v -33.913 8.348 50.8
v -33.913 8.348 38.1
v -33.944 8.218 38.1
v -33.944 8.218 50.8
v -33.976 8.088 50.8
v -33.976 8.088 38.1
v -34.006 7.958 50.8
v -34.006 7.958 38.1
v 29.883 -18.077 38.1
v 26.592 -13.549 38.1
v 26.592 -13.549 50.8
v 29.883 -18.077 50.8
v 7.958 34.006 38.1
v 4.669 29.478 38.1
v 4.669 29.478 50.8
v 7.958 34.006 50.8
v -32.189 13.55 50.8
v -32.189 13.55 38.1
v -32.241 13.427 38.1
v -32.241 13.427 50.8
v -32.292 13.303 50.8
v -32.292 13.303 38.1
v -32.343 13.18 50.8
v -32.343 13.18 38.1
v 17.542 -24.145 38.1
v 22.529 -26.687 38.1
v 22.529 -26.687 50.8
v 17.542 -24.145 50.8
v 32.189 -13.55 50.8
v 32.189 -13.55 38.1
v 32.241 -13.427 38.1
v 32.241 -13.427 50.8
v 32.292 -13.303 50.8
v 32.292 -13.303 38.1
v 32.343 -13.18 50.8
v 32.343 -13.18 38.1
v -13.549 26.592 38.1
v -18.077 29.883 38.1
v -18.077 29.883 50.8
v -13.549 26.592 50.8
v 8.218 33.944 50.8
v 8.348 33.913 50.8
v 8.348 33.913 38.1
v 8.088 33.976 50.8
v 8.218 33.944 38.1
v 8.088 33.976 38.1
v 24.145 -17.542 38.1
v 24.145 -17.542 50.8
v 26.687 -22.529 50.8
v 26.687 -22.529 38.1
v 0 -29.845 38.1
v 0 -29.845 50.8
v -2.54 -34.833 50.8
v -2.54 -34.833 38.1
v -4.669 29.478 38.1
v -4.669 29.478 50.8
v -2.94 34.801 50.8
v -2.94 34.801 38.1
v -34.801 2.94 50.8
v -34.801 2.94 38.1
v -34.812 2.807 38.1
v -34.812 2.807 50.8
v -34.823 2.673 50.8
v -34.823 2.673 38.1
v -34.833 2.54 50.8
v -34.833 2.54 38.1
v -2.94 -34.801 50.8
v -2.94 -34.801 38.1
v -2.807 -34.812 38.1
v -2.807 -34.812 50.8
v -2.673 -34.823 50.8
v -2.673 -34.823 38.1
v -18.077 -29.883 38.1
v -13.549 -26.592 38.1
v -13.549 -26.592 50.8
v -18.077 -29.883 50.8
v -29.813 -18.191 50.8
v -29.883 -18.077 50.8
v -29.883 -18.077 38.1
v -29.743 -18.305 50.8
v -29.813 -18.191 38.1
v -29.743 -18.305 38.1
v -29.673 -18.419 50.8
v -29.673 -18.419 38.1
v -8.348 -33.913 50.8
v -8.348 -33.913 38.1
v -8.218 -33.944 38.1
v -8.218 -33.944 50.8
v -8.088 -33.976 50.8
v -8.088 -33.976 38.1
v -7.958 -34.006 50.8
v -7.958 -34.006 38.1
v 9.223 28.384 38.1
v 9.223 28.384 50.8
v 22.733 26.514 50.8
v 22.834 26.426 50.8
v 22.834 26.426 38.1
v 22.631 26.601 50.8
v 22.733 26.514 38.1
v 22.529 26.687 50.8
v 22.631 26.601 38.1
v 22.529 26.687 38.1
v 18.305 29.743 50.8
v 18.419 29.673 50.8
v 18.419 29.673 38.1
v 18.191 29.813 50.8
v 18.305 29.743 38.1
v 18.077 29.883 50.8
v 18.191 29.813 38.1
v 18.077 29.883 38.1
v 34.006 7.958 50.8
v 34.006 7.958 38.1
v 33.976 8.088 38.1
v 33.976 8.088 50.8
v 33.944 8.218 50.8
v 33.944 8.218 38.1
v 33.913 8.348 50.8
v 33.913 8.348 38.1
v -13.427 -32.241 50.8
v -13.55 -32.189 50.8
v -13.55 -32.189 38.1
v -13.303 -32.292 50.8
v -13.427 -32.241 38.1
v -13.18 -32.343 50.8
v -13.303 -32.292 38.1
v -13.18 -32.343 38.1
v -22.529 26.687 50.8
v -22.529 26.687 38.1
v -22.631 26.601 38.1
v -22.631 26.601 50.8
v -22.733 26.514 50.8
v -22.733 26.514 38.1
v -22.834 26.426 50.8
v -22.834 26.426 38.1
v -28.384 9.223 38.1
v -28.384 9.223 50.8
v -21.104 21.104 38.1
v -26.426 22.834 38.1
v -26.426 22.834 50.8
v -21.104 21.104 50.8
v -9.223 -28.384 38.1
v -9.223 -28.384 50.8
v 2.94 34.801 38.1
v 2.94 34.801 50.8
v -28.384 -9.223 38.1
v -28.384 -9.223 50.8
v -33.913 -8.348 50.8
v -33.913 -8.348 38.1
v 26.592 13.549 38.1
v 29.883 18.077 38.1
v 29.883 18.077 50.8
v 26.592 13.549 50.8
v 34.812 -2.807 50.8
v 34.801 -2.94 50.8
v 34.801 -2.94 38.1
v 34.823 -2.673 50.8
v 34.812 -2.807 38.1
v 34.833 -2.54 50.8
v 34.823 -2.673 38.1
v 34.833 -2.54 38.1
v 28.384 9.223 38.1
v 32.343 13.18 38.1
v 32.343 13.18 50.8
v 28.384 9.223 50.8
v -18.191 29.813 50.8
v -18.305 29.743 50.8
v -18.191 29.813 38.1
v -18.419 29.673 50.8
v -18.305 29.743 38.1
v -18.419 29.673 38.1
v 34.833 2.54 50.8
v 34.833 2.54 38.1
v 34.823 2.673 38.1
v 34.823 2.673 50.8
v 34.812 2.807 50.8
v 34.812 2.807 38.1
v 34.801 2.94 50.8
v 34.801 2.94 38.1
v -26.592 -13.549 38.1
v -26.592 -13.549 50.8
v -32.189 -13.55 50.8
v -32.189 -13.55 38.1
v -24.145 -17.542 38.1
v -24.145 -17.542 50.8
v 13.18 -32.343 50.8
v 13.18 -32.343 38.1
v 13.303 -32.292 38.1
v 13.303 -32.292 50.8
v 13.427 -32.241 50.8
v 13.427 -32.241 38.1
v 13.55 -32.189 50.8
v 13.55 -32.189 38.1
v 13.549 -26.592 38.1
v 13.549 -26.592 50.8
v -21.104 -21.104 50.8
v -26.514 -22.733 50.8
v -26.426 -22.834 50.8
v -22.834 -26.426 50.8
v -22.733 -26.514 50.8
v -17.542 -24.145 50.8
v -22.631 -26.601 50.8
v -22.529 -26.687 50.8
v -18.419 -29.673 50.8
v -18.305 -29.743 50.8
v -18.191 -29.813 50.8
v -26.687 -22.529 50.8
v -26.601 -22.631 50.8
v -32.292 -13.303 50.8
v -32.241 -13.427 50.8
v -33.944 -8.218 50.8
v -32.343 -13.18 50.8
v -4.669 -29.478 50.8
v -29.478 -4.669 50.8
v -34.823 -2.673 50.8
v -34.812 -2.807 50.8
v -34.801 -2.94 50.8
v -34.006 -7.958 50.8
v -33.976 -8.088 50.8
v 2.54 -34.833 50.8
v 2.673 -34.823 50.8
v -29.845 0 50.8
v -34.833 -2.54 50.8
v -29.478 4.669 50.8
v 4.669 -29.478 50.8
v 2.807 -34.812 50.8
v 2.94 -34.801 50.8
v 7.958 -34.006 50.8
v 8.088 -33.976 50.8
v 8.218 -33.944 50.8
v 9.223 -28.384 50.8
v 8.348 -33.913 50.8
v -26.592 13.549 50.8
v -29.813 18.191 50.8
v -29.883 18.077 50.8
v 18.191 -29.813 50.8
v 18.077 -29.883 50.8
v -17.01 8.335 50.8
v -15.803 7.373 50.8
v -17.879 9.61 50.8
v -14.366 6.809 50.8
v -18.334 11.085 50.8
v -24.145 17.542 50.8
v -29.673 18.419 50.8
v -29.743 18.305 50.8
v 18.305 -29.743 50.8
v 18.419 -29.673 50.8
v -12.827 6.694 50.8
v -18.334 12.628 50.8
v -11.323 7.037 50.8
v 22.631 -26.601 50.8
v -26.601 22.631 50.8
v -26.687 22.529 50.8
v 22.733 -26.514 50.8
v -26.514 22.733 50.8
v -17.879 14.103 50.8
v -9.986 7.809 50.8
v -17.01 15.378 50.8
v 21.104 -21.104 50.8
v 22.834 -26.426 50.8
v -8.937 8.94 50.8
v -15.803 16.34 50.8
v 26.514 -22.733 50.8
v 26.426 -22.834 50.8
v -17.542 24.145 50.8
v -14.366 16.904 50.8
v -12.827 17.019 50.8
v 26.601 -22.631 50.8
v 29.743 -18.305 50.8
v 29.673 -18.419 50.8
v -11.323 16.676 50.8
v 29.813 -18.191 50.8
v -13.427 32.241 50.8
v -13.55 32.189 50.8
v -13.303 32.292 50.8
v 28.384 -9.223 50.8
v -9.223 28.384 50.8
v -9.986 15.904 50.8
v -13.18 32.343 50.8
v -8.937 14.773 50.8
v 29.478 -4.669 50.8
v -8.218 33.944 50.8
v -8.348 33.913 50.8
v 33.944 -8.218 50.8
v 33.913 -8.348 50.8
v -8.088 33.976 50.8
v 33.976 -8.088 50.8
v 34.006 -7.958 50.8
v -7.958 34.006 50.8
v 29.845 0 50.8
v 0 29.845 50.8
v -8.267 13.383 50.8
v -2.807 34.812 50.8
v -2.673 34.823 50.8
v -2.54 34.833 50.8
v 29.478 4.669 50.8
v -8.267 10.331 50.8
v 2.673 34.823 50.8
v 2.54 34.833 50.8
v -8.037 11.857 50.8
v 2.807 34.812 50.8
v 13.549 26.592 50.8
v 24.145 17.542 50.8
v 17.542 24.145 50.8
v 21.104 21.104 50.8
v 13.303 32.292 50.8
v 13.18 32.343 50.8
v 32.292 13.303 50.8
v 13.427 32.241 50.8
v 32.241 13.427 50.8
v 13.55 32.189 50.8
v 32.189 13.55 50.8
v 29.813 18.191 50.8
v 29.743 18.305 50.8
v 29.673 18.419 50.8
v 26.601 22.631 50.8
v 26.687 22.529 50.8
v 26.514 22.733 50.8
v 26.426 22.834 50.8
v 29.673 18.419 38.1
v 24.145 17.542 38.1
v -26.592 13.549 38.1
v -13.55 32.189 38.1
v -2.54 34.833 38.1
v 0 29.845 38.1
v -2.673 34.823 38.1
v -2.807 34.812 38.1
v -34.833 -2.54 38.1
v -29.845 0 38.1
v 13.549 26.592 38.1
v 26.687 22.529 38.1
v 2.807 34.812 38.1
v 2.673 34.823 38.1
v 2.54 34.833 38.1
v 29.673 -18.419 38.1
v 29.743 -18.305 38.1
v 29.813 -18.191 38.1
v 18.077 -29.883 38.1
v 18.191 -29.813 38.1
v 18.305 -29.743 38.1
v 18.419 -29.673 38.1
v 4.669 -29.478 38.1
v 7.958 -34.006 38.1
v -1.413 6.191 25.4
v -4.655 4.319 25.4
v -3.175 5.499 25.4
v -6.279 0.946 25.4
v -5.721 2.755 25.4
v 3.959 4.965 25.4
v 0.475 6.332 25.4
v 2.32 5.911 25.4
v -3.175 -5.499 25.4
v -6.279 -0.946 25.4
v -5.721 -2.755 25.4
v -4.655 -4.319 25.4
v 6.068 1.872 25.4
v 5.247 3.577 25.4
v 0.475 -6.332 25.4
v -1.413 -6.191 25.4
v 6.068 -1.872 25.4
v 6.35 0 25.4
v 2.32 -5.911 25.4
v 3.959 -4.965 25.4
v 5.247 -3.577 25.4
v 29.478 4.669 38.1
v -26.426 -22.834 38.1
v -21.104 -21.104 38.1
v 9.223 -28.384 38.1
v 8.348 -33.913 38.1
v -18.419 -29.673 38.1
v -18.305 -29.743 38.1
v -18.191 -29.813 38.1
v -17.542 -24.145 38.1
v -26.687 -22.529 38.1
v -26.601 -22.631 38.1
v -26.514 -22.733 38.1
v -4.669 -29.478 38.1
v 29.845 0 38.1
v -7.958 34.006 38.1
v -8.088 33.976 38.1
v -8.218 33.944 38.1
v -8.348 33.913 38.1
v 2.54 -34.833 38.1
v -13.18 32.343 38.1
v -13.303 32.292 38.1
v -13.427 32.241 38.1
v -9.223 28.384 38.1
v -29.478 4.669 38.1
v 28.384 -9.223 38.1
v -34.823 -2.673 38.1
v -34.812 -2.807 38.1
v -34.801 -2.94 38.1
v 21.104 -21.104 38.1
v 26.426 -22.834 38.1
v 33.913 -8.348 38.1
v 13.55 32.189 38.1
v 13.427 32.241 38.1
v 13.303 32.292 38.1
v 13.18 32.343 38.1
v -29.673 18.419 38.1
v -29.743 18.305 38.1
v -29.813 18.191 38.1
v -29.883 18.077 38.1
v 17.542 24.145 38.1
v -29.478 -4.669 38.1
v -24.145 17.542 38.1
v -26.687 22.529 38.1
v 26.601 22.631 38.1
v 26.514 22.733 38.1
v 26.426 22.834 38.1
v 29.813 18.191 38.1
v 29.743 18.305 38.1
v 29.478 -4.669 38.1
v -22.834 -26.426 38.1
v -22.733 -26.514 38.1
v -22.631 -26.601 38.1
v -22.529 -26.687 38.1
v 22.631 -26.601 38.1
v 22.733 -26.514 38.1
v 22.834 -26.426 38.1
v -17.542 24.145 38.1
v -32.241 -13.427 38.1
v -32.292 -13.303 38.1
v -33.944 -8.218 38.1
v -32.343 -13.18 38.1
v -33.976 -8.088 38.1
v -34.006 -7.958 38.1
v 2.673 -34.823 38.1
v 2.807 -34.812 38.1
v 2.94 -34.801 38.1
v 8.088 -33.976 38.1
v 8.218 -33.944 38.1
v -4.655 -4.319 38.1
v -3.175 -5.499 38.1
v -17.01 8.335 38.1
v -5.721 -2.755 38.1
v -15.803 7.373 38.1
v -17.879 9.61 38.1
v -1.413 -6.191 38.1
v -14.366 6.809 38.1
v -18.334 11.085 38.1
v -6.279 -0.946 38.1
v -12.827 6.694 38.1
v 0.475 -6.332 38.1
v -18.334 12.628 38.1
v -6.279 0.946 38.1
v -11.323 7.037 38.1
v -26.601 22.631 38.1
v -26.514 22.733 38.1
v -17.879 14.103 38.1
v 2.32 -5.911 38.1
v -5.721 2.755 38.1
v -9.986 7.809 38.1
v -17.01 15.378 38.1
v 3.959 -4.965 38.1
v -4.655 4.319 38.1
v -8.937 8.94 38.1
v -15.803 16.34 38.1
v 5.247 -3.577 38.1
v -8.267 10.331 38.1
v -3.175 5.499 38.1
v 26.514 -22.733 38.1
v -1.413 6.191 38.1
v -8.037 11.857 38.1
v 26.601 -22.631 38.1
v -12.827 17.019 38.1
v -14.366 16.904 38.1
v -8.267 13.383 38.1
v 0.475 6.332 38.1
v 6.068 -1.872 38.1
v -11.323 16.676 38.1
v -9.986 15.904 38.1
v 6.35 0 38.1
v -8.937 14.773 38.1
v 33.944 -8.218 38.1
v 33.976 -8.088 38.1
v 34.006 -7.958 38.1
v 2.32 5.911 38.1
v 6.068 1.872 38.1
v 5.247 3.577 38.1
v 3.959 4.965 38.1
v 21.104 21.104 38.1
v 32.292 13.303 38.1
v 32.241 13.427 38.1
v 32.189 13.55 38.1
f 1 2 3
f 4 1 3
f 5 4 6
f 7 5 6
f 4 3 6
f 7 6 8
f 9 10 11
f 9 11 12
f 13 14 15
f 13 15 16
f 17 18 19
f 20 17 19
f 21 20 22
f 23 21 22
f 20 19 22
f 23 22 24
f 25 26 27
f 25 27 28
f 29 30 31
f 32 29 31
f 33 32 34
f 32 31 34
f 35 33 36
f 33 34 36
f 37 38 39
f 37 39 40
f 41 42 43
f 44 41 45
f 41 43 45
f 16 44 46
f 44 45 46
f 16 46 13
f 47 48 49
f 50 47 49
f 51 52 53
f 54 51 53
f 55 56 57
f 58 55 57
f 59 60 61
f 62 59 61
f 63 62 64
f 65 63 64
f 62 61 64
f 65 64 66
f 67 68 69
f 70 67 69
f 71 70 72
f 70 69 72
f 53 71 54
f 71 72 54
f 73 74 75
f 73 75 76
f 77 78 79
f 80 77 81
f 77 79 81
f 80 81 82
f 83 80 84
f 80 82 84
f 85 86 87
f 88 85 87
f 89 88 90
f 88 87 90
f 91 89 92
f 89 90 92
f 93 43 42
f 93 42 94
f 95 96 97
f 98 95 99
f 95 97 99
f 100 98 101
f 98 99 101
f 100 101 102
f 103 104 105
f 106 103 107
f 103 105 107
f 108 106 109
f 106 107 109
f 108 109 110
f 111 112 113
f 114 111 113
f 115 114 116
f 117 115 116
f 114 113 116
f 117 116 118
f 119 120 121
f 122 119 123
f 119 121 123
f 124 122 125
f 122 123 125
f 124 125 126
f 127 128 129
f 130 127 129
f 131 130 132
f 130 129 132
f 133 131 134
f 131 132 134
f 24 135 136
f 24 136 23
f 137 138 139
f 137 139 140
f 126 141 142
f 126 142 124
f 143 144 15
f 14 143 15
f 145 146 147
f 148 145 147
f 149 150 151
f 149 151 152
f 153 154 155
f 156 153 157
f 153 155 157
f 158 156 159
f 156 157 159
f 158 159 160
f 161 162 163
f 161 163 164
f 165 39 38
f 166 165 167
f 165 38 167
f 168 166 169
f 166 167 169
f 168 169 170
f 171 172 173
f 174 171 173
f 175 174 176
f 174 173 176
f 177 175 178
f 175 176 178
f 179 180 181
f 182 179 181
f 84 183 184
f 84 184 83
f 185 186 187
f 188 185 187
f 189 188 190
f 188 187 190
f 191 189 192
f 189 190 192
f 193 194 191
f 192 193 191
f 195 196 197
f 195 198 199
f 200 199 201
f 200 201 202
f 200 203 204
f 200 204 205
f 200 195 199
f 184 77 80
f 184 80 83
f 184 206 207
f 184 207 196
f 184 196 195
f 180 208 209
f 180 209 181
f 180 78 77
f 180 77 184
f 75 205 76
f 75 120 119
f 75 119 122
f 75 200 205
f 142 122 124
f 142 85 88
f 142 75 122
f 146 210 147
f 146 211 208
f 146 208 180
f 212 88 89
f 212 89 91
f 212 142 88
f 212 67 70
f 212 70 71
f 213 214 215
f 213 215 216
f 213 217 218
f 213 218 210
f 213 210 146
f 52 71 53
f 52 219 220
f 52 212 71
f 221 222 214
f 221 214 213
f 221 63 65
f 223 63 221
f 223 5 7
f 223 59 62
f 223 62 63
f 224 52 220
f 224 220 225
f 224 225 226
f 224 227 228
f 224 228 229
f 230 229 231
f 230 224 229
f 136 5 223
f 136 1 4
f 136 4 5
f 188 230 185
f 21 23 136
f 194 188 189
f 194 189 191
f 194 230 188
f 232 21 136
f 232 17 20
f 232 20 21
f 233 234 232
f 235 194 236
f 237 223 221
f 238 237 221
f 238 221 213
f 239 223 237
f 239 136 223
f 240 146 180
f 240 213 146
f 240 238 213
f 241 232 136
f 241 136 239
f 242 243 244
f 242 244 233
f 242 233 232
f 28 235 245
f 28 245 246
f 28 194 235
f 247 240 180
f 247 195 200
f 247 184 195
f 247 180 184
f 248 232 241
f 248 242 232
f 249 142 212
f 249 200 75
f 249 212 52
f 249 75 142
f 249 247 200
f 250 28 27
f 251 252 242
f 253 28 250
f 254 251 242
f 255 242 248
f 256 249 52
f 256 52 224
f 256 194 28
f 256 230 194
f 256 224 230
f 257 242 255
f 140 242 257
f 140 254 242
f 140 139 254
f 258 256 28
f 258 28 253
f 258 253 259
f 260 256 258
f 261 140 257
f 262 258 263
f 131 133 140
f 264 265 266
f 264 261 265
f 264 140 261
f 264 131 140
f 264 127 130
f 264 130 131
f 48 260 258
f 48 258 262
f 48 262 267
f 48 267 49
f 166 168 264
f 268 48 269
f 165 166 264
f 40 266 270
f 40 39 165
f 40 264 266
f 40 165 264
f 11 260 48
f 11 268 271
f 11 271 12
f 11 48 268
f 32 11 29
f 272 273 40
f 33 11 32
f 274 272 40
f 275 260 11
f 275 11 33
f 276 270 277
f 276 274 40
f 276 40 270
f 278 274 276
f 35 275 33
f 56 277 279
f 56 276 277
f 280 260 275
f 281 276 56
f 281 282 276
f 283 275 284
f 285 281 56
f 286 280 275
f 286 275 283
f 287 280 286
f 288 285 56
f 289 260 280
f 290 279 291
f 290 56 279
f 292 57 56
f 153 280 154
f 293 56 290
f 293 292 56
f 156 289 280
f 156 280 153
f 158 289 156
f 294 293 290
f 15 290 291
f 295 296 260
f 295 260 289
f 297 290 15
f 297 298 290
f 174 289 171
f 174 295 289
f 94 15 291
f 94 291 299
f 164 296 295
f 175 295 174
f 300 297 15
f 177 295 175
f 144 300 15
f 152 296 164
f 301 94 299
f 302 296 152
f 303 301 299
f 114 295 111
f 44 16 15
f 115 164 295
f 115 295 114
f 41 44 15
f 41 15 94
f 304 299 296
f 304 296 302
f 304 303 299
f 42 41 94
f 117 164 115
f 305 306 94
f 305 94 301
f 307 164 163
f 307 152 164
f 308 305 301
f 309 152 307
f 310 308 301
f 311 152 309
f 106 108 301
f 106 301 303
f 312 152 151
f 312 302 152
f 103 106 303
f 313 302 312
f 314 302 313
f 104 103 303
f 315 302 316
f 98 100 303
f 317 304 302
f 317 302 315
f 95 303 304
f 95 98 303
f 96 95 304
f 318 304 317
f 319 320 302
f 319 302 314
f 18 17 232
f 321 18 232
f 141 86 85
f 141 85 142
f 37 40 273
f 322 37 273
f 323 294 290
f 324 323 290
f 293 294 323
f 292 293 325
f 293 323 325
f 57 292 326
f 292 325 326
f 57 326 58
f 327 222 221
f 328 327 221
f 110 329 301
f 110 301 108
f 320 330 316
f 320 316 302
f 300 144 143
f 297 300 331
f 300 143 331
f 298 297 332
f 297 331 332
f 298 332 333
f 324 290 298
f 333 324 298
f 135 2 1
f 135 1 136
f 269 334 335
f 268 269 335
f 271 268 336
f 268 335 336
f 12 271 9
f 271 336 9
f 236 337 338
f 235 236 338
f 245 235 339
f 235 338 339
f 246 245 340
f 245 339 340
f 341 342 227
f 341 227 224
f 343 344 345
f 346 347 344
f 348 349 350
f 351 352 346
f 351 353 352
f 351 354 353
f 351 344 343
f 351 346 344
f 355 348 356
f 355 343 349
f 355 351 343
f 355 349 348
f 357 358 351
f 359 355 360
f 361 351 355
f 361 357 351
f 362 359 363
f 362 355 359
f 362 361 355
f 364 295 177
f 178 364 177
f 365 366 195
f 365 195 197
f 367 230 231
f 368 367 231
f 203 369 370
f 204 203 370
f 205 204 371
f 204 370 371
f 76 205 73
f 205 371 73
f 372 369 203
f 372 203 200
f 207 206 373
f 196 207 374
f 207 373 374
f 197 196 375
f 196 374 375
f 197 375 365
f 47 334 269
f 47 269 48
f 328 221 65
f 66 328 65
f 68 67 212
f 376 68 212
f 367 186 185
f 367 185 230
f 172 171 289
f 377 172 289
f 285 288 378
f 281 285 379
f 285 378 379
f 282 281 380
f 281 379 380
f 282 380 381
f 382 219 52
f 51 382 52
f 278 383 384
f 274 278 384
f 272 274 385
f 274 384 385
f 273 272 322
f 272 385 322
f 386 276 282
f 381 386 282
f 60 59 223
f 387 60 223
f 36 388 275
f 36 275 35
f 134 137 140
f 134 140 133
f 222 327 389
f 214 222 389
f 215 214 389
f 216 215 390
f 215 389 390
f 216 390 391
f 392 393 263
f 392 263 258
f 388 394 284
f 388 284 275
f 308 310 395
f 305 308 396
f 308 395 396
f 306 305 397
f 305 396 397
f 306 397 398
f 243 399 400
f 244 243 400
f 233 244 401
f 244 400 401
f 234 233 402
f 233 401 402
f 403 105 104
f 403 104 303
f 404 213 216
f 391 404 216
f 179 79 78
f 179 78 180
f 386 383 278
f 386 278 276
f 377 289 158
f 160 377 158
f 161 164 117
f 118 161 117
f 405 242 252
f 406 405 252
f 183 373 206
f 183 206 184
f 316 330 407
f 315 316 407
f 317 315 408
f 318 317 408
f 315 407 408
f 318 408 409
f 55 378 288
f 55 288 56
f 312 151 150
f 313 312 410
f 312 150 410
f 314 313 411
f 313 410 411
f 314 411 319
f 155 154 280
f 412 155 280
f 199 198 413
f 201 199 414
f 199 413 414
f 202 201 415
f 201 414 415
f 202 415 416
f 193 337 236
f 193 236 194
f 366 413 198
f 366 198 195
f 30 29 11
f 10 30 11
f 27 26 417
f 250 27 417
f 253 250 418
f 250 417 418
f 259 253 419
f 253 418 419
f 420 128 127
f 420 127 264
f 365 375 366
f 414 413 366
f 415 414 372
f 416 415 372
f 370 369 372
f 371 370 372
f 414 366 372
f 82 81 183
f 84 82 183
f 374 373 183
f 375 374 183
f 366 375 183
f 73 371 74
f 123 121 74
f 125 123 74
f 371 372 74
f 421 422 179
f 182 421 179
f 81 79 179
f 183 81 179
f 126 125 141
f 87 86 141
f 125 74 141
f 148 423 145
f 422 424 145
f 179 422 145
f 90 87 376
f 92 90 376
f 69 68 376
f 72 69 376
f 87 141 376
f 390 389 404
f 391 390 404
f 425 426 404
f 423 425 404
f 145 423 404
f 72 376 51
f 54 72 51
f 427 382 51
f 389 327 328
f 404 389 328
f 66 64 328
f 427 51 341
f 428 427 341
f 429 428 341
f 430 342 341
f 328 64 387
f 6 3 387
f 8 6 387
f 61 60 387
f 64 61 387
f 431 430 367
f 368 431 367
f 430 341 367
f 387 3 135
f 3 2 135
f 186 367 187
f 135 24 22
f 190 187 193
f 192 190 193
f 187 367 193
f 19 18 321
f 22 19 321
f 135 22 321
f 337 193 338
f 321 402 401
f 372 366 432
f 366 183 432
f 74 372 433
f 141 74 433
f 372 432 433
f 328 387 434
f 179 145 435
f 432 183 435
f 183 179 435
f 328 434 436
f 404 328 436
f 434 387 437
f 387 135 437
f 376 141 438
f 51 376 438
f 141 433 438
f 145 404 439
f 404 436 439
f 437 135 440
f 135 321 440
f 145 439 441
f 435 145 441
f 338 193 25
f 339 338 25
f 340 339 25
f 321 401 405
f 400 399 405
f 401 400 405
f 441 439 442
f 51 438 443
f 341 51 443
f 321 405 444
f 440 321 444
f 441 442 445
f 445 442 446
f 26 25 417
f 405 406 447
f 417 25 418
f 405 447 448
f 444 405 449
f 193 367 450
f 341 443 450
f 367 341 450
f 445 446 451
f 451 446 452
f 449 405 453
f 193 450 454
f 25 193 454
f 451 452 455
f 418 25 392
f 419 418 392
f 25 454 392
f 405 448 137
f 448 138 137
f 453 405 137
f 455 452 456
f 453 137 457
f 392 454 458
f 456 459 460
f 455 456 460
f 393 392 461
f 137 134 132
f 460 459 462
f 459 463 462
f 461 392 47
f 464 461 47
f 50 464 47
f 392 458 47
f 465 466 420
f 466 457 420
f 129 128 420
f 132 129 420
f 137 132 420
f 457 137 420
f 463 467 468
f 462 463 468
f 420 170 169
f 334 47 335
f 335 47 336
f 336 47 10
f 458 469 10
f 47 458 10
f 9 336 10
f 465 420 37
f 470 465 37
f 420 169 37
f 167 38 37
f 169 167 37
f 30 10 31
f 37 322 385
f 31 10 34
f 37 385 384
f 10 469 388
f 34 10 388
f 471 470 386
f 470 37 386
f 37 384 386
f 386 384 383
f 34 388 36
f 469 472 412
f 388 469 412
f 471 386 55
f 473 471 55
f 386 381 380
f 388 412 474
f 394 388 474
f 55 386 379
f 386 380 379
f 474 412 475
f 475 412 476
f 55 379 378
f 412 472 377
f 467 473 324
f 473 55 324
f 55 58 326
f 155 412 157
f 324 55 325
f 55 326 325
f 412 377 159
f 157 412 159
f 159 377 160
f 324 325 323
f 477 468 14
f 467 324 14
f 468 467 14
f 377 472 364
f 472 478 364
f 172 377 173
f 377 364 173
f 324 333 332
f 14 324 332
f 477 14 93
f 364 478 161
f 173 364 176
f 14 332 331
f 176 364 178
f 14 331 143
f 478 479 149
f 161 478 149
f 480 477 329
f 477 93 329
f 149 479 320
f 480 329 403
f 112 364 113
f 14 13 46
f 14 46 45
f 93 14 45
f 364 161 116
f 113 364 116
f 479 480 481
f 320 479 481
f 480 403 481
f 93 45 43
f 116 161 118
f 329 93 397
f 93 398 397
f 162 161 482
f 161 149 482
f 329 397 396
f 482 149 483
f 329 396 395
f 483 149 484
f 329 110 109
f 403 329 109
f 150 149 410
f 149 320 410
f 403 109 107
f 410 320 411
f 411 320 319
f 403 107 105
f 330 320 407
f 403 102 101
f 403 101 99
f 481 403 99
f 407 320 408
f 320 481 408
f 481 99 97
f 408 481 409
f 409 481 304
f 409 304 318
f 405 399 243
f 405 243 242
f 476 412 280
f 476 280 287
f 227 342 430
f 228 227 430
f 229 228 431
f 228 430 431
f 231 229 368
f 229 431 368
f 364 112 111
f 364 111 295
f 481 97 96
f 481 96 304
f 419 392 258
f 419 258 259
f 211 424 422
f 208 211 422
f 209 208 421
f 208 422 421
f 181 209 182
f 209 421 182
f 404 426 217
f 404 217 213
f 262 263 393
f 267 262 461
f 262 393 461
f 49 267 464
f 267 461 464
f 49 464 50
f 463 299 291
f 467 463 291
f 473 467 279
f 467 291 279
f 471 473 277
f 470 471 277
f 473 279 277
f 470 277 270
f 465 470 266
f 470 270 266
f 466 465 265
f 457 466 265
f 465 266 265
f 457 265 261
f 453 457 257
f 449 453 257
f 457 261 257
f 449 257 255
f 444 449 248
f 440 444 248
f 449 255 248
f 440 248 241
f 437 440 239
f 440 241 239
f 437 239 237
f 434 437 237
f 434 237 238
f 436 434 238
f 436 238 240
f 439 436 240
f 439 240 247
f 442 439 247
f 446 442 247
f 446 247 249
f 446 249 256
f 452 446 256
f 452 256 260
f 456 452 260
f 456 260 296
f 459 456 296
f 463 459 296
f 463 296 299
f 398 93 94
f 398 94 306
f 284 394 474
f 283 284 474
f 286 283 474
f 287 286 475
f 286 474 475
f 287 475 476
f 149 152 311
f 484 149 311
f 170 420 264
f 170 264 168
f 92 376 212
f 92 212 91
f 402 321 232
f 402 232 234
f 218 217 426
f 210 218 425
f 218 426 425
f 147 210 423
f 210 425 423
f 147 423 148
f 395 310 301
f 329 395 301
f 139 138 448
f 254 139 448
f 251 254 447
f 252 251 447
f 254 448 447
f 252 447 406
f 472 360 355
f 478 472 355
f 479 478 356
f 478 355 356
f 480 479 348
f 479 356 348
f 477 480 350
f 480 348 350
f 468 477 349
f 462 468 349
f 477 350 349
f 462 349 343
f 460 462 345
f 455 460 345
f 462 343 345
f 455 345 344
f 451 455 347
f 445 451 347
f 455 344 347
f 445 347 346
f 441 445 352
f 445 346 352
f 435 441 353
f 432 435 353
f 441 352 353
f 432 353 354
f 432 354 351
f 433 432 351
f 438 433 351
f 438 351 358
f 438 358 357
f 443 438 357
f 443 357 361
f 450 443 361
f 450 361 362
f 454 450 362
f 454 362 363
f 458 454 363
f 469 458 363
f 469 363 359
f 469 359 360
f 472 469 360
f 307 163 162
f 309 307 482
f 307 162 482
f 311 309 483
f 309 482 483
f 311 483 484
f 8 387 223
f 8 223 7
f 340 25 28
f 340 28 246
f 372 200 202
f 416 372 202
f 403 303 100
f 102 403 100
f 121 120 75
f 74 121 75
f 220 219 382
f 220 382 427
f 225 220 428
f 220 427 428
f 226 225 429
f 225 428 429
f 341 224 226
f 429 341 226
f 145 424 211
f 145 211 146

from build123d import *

# Parameters (mm, degrees)
F0_R           = 19.05
F1_DEPTH       = 6.35
F2_R           = 6.35
F3_DEPTH       = 31.75
F4_R           = 34.925
F5_DEPTH       = 12.7
F7_DEPTH       = 25.4
F9_DEPTH       = 25.4
F10_W          = 101.6
F10_H          = 25.4
F11_DEPTH      = 34.8335139058
F11_DEPTH_BACK = 34.8335139058
F12_R          = 5.1772448442
F13_DEPTH      = 25.4


with BuildPart() as f1:
    # F0 (on Top) → F1 (new body)
    with BuildSketch(Plane.XY):
        Circle(F0_R)
    extrude(amount=F1_DEPTH)

    # F2 (on face) → F3 (join)
    with BuildSketch(Plane.XY.offset(6.35)):
        Circle(F2_R)
    extrude(amount=F3_DEPTH)

    # F4 (on face) → F5 (join)
    with BuildSketch(Plane.XY.offset(38.1)):
        Circle(F4_R)
    extrude(amount=F5_DEPTH)

    # F6 (on face) → F7 (cut)
    with BuildSketch(Plane(origin=(0, 0, 0), x_dir=(1, 0, 0), z_dir=(0, 0, -1))):
        with BuildLine():
            Line((-2.54, 18.8799073091), (0, 16.51))
            Line((0, 16.51), (2.54, 18.8799073091))
            ThreePointArc((2.54, 18.8799073091), (0, 19.05), (-2.54, 18.8799073091))
        make_face()
        with BuildLine():
            Line((-8.2498957621, 17.1709557077), (-5.1018705771, 15.701943084))
            Line((-5.1018705771, 15.701943084), (-3.4185286593, 18.7407620391))
            ThreePointArc((-3.4185286593, 18.7407620391), (-5.8867737428, 18.1176266354), (-8.2498957621, 17.1709557077))
        make_face()
        with BuildLine():
            Line((-13.1522342466, 13.7811913245), (-9.7043345153, 13.3568705771))
            Line((-9.7043345153, 13.3568705771), (-9.0424279152, 16.7671404061))
            ThreePointArc((-9.0424279152, 16.7671404061), (-11.1973090562, 15.4117737428), (-13.1522342466, 13.7811913245))
        make_face()
        with BuildLine():
            Line((-16.7671404061, 9.0424279152), (-13.3568705771, 9.7043345153))
            Line((-13.3568705771, 9.7043345153), (-13.7811913245, 13.1522342466))
            ThreePointArc((-13.7811913245, 13.1522342466), (-15.4117737428, 11.1973090562), (-16.7671404061, 9.0424279152))
        make_face()
        with BuildLine():
            Line((-18.7407620391, 3.4185286593), (-15.701943084, 5.1018705771))
            Line((-15.701943084, 5.1018705771), (-17.1709557077, 8.2498957621))
            ThreePointArc((-17.1709557077, 8.2498957621), (-18.1176266354, 5.8867737428), (-18.7407620391, 3.4185286593))
        make_face()
        with BuildLine():
            Line((-18.8799073091, -2.54), (-16.51, 0))
            Line((-16.51, 0), (-18.8799073091, 2.54))
            ThreePointArc((-18.8799073091, 2.54), (-19.05, 0), (-18.8799073091, -2.54))
        make_face()
        with BuildLine():
            Line((-17.1709557077, -8.2498957621), (-15.701943084, -5.1018705771))
            Line((-15.701943084, -5.1018705771), (-18.7407620391, -3.4185286593))
            ThreePointArc((-18.7407620391, -3.4185286593), (-18.1176266354, -5.8867737428), (-17.1709557077, -8.2498957621))
        make_face()
        with BuildLine():
            Line((-13.7811913245, -13.1522342466), (-13.3568705771, -9.7043345153))
            Line((-13.3568705771, -9.7043345153), (-16.7671404061, -9.0424279152))
            ThreePointArc((-16.7671404061, -9.0424279152), (-15.4117737428, -11.1973090562), (-13.7811913245, -13.1522342466))
        make_face()
        with BuildLine():
            Line((-9.0424279152, -16.7671404061), (-9.7043345153, -13.3568705771))
            Line((-9.7043345153, -13.3568705771), (-13.1522342466, -13.7811913245))
            ThreePointArc((-13.1522342466, -13.7811913245), (-11.1973090562, -15.4117737428), (-9.0424279152, -16.7671404061))
        make_face()
        with BuildLine():
            Line((-3.4185286593, -18.7407620391), (-5.1018705771, -15.701943084))
            Line((-5.1018705771, -15.701943084), (-8.2498957621, -17.1709557077))
            ThreePointArc((-8.2498957621, -17.1709557077), (-5.8867737428, -18.1176266354), (-3.4185286593, -18.7407620391))
        make_face()
        with BuildLine():
            Line((2.54, -18.8799073091), (0, -16.51))
            Line((0, -16.51), (-2.54, -18.8799073091))
            ThreePointArc((-2.54, -18.8799073091), (0, -19.05), (2.54, -18.8799073091))
        make_face()
        with BuildLine():
            Line((8.2498957621, -17.1709557077), (5.1018705771, -15.701943084))
            Line((5.1018705771, -15.701943084), (3.4185286593, -18.7407620391))
            ThreePointArc((3.4185286593, -18.7407620391), (5.8867737428, -18.1176266354), (8.2498957621, -17.1709557077))
        make_face()
        with BuildLine():
            Line((13.1522342466, -13.7811913245), (9.7043345153, -13.3568705771))
            Line((9.7043345153, -13.3568705771), (9.0424279152, -16.7671404061))
            ThreePointArc((9.0424279152, -16.7671404061), (11.1973090562, -15.4117737428), (13.1522342466, -13.7811913245))
        make_face()
        with BuildLine():
            Line((16.7671404061, -9.0424279152), (13.3568705771, -9.7043345153))
            Line((13.3568705771, -9.7043345153), (13.7811913245, -13.1522342466))
            ThreePointArc((13.7811913245, -13.1522342466), (15.4117737428, -11.1973090562), (16.7671404061, -9.0424279152))
        make_face()
        with BuildLine():
            Line((18.7407620391, -3.4185286593), (15.701943084, -5.1018705771))
            Line((15.701943084, -5.1018705771), (17.1709557077, -8.2498957621))
            ThreePointArc((17.1709557077, -8.2498957621), (18.1176266354, -5.8867737428), (18.7407620391, -3.4185286593))
        make_face()
        with BuildLine():
            Line((18.8799073091, 2.54), (16.51, 0))
            Line((16.51, 0), (18.8799073091, -2.54))
            ThreePointArc((18.8799073091, -2.54), (19.05, 0), (18.8799073091, 2.54))
        make_face()
        with BuildLine():
            Line((17.1709557077, 8.2498957621), (15.701943084, 5.1018705771))
            Line((15.701943084, 5.1018705771), (18.7407620391, 3.4185286593))
            ThreePointArc((18.7407620391, 3.4185286593), (18.1176266354, 5.8867737428), (17.1709557077, 8.2498957621))
        make_face()
        with BuildLine():
            Line((13.7811913245, 13.1522342466), (13.3568705771, 9.7043345153))
            Line((13.3568705771, 9.7043345153), (16.7671404061, 9.0424279152))
            ThreePointArc((16.7671404061, 9.0424279152), (15.4117737428, 11.1973090562), (13.7811913245, 13.1522342466))
        make_face()
        with BuildLine():
            Line((9.0424279152, 16.7671404061), (9.7043345153, 13.3568705771))
            Line((9.7043345153, 13.3568705771), (13.1522342466, 13.7811913245))
            ThreePointArc((13.1522342466, 13.7811913245), (11.1973090562, 15.4117737428), (9.0424279152, 16.7671404061))
        make_face()
        with BuildLine():
            Line((3.4185286593, 18.7407620391), (5.1018705771, 15.701943084))
            Line((5.1018705771, 15.701943084), (8.2498957621, 17.1709557077))
            ThreePointArc((8.2498957621, 17.1709557077), (5.8867737428, 18.1176266354), (3.4185286593, 18.7407620391))
        make_face()
    extrude(amount=-F7_DEPTH, mode=Mode.SUBTRACT)

    # F8 (on face) → F9 (cut)
    with BuildSketch(Plane.XY.offset(50.8)):
        with BuildLine():
            Line((-2.54, 34.8325139058), (0, 29.845))
            Line((0, 29.845), (2.54, 34.8325139058))
            ThreePointArc((2.54, 34.8325139058), (0, 34.925), (-2.54, 34.8325139058))
        make_face()
        with BuildLine():
            Line((-7.957734064, 34.0063243172), (-4.6687866091, 29.4775585251))
            Line((-4.6687866091, 29.4775585251), (-2.9402772938, 34.8010113996))
            ThreePointArc((-2.9402772938, 34.8010113996), (-5.4634736915, 34.4950152953), (-7.957734064, 34.0063243172))
        make_face()
        with BuildLine():
            Line((-13.1795223051, 32.3427861634), (-9.2226121971, 28.3842817288))
            Line((-9.2226121971, 28.3842817288), (-8.3481552023, 33.9125924948))
            ThreePointArc((-8.3481552023, 33.9125924948), (-10.7924185285, 33.2156488316), (-13.1795223051, 32.3427861634))
        make_face()
        with BuildLine():
            Line((-18.0767869667, 29.8828612746), (-13.5493464647, 26.5920897144))
            Line((-13.5493464647, 26.5920897144), (-13.5504738239, 32.1891330133))
            ThreePointArc((-13.5504738239, 32.1891330133), (-15.8556182034, 31.1184028573), (-18.0767869667, 29.8828612746))
        make_face()
        with BuildLine():
            Line((-22.5289411398, 26.6871211658), (-17.5424508547, 24.1451121971))
            Line((-17.5424508547, 24.1451121971), (-18.4191348084, 29.6730702474))
            ThreePointArc((-18.4191348084, 29.6730702474), (-20.5283999363, 28.2549185285), (-22.5289411398, 26.6871211658))
        make_face()
        with BuildLine():
            Line((-26.4263580128, 22.8342555644), (-21.1036018845, 21.1036018845))
            Line((-21.1036018845, 21.1036018845), (-22.8342555644, 26.4263580128))
            ThreePointArc((-22.8342555644, 26.4263580128), (-24.6957043329, 24.6957043329), (-26.4263580128, 22.8342555644))
        make_face()
        with BuildLine():
            Line((-29.6730702474, 18.4191348084), (-24.1451121971, 17.5424508547))
            Line((-24.1451121971, 17.5424508547), (-26.6871211658, 22.5289411398))
            ThreePointArc((-26.6871211658, 22.5289411398), (-28.2549185285, 20.5283999363), (-29.6730702474, 18.4191348084))
        make_face()
        with BuildLine():
            Line((-32.1891330133, 13.5504738239), (-26.5920897144, 13.5493464647))
            Line((-26.5920897144, 13.5493464647), (-29.8828612746, 18.0767869667))
            ThreePointArc((-29.8828612746, 18.0767869667), (-31.1184028573, 15.8556182034), (-32.1891330133, 13.5504738239))
        make_face()
        with BuildLine():
            Line((-33.9125924948, 8.3481552023), (-28.3842817288, 9.2226121971))
            Line((-28.3842817288, 9.2226121971), (-32.3427861634, 13.1795223051))
            ThreePointArc((-32.3427861634, 13.1795223051), (-33.2156488316, 10.7924185285), (-33.9125924948, 8.3481552023))
        make_face()
        with BuildLine():
            Line((-34.8010113996, 2.9402772938), (-29.4775585251, 4.6687866091))
            Line((-29.4775585251, 4.6687866091), (-34.0063243172, 7.957734064))
            ThreePointArc((-34.0063243172, 7.957734064), (-34.4950152953, 5.4634736915), (-34.8010113996, 2.9402772938))
        make_face()
        with BuildLine():
            Line((-34.8325139058, -2.54), (-29.845, 0))
            Line((-29.845, 0), (-34.8325139058, 2.54))
            ThreePointArc((-34.8325139058, 2.54), (-34.925, 0), (-34.8325139058, -2.54))
        make_face()
        with BuildLine():
            Line((-34.0063243172, -7.957734064), (-29.4775585251, -4.6687866091))
            Line((-29.4775585251, -4.6687866091), (-34.8010113996, -2.9402772938))
            ThreePointArc((-34.8010113996, -2.9402772938), (-34.4950152953, -5.4634736915), (-34.0063243172, -7.957734064))
        make_face()
        with BuildLine():
            Line((-32.3427861634, -13.1795223051), (-28.3842817288, -9.2226121971))
            Line((-28.3842817288, -9.2226121971), (-33.9125924948, -8.3481552023))
            ThreePointArc((-33.9125924948, -8.3481552023), (-33.2156488316, -10.7924185285), (-32.3427861634, -13.1795223051))
        make_face()
        with BuildLine():
            Line((-29.8828612746, -18.0767869667), (-26.5920897144, -13.5493464647))
            Line((-26.5920897144, -13.5493464647), (-32.1891330133, -13.5504738239))
            ThreePointArc((-32.1891330133, -13.5504738239), (-31.1184028573, -15.8556182034), (-29.8828612746, -18.0767869667))
        make_face()
        with BuildLine():
            Line((-26.6871211658, -22.5289411398), (-24.1451121971, -17.5424508547))
            Line((-24.1451121971, -17.5424508547), (-29.6730702474, -18.4191348084))
            ThreePointArc((-29.6730702474, -18.4191348084), (-28.2549185285, -20.5283999363), (-26.6871211658, -22.5289411398))
        make_face()
        with BuildLine():
            Line((-22.8342555644, -26.4263580128), (-21.1036018845, -21.1036018845))
            Line((-21.1036018845, -21.1036018845), (-26.4263580128, -22.8342555644))
            ThreePointArc((-26.4263580128, -22.8342555644), (-24.6957043329, -24.6957043329), (-22.8342555644, -26.4263580128))
        make_face()
        with BuildLine():
            Line((-18.4191348084, -29.6730702474), (-17.5424508547, -24.1451121971))
            Line((-17.5424508547, -24.1451121971), (-22.5289411398, -26.6871211658))
            ThreePointArc((-22.5289411398, -26.6871211658), (-20.5283999363, -28.2549185285), (-18.4191348084, -29.6730702474))
        make_face()
        with BuildLine():
            Line((-13.5504738239, -32.1891330133), (-13.5493464647, -26.5920897144))
            Line((-13.5493464647, -26.5920897144), (-18.0767869667, -29.8828612746))
            ThreePointArc((-18.0767869667, -29.8828612746), (-15.8556182034, -31.1184028573), (-13.5504738239, -32.1891330133))
        make_face()
        with BuildLine():
            Line((-8.3481552023, -33.9125924948), (-9.2226121971, -28.3842817288))
            Line((-9.2226121971, -28.3842817288), (-13.1795223051, -32.3427861634))
            ThreePointArc((-13.1795223051, -32.3427861634), (-10.7924185285, -33.2156488316), (-8.3481552023, -33.9125924948))
        make_face()
        with BuildLine():
            Line((-2.9402772938, -34.8010113996), (-4.6687866091, -29.4775585251))
            Line((-4.6687866091, -29.4775585251), (-7.957734064, -34.0063243172))
            ThreePointArc((-7.957734064, -34.0063243172), (-5.4634736915, -34.4950152953), (-2.9402772938, -34.8010113996))
        make_face()
        with BuildLine():
            Line((2.54, -34.8325139058), (0, -29.845))
            Line((0, -29.845), (-2.54, -34.8325139058))
            ThreePointArc((-2.54, -34.8325139058), (0, -34.925), (2.54, -34.8325139058))
        make_face()
        with BuildLine():
            Line((7.957734064, -34.0063243172), (4.6687866091, -29.4775585251))
            Line((4.6687866091, -29.4775585251), (2.9402772938, -34.8010113996))
            ThreePointArc((2.9402772938, -34.8010113996), (5.4634736915, -34.4950152953), (7.957734064, -34.0063243172))
        make_face()
        with BuildLine():
            Line((13.1795223051, -32.3427861634), (9.2226121971, -28.3842817288))
            Line((9.2226121971, -28.3842817288), (8.3481552023, -33.9125924948))
            ThreePointArc((8.3481552023, -33.9125924948), (10.7924185285, -33.2156488316), (13.1795223051, -32.3427861634))
        make_face()
        with BuildLine():
            Line((18.0767869667, -29.8828612746), (13.5493464647, -26.5920897144))
            Line((13.5493464647, -26.5920897144), (13.5504738239, -32.1891330133))
            ThreePointArc((13.5504738239, -32.1891330133), (15.8556182034, -31.1184028573), (18.0767869667, -29.8828612746))
        make_face()
        with BuildLine():
            Line((22.5289411398, -26.6871211658), (17.5424508547, -24.1451121971))
            Line((17.5424508547, -24.1451121971), (18.4191348084, -29.6730702474))
            ThreePointArc((18.4191348084, -29.6730702474), (20.5283999363, -28.2549185285), (22.5289411398, -26.6871211658))
        make_face()
        with BuildLine():
            Line((26.4263580128, -22.8342555644), (21.1036018845, -21.1036018845))
            Line((21.1036018845, -21.1036018845), (22.8342555644, -26.4263580128))
            ThreePointArc((22.8342555644, -26.4263580128), (24.6957043329, -24.6957043329), (26.4263580128, -22.8342555644))
        make_face()
        with BuildLine():
            Line((29.6730702474, -18.4191348084), (24.1451121971, -17.5424508547))
            Line((24.1451121971, -17.5424508547), (26.6871211658, -22.5289411398))
            ThreePointArc((26.6871211658, -22.5289411398), (28.2549185285, -20.5283999363), (29.6730702474, -18.4191348084))
        make_face()
        with BuildLine():
            Line((32.1891330133, -13.5504738239), (26.5920897144, -13.5493464647))
            Line((26.5920897144, -13.5493464647), (29.8828612746, -18.0767869667))
            ThreePointArc((29.8828612746, -18.0767869667), (31.1184028573, -15.8556182034), (32.1891330133, -13.5504738239))
        make_face()
        with BuildLine():
            Line((33.9125924948, -8.3481552023), (28.3842817288, -9.2226121971))
            Line((28.3842817288, -9.2226121971), (32.3427861634, -13.1795223051))
            ThreePointArc((32.3427861634, -13.1795223051), (33.2156488316, -10.7924185285), (33.9125924948, -8.3481552023))
        make_face()
        with BuildLine():
            Line((34.8010113996, -2.9402772938), (29.4775585251, -4.6687866091))
            Line((29.4775585251, -4.6687866091), (34.0063243172, -7.957734064))
            ThreePointArc((34.0063243172, -7.957734064), (34.4950152953, -5.4634736915), (34.8010113996, -2.9402772938))
        make_face()
        with BuildLine():
            Line((34.8325139058, 2.54), (29.845, 0))
            Line((29.845, 0), (34.8325139058, -2.54))
            ThreePointArc((34.8325139058, -2.54), (34.925, 0), (34.8325139058, 2.54))
        make_face()
        with BuildLine():
            Line((34.0063243172, 7.957734064), (29.4775585251, 4.6687866091))
            Line((29.4775585251, 4.6687866091), (34.8010113996, 2.9402772938))
            ThreePointArc((34.8010113996, 2.9402772938), (34.4950152953, 5.4634736915), (34.0063243172, 7.957734064))
        make_face()
        with BuildLine():
            Line((32.3427861634, 13.1795223051), (28.3842817288, 9.2226121971))
            Line((28.3842817288, 9.2226121971), (33.9125924948, 8.3481552023))
            ThreePointArc((33.9125924948, 8.3481552023), (33.2156488316, 10.7924185285), (32.3427861634, 13.1795223051))
        make_face()
        with BuildLine():
            Line((29.8828612746, 18.0767869667), (26.5920897144, 13.5493464647))
            Line((26.5920897144, 13.5493464647), (32.1891330133, 13.5504738239))
            ThreePointArc((32.1891330133, 13.5504738239), (31.1184028573, 15.8556182034), (29.8828612746, 18.0767869667))
        make_face()
        with BuildLine():
            Line((26.6871211658, 22.5289411398), (24.1451121971, 17.5424508547))
            Line((24.1451121971, 17.5424508547), (29.6730702474, 18.4191348084))
            ThreePointArc((29.6730702474, 18.4191348084), (28.2549185285, 20.5283999363), (26.6871211658, 22.5289411398))
        make_face()
        with BuildLine():
            Line((22.8342555644, 26.4263580128), (21.1036018845, 21.1036018845))
            Line((21.1036018845, 21.1036018845), (26.4263580128, 22.8342555644))
            ThreePointArc((26.4263580128, 22.8342555644), (24.6957043329, 24.6957043329), (22.8342555644, 26.4263580128))
        make_face()
        with BuildLine():
            Line((18.4191348084, 29.6730702474), (17.5424508547, 24.1451121971))
            Line((17.5424508547, 24.1451121971), (22.5289411398, 26.6871211658))
            ThreePointArc((22.5289411398, 26.6871211658), (20.5283999363, 28.2549185285), (18.4191348084, 29.6730702474))
        make_face()
        with BuildLine():
            Line((13.5504738239, 32.1891330133), (13.5493464647, 26.5920897144))
            Line((13.5493464647, 26.5920897144), (18.0767869667, 29.8828612746))
            ThreePointArc((18.0767869667, 29.8828612746), (15.8556182034, 31.1184028573), (13.5504738239, 32.1891330133))
        make_face()
        with BuildLine():
            Line((8.3481552023, 33.9125924948), (9.2226121971, 28.3842817288))
            Line((9.2226121971, 28.3842817288), (13.1795223051, 32.3427861634))
            ThreePointArc((13.1795223051, 32.3427861634), (10.7924185285, 33.2156488316), (8.3481552023, 33.9125924948))
        make_face()
        with BuildLine():
            Line((2.9402772938, 34.8010113996), (4.6687866091, 29.4775585251))
            Line((4.6687866091, 29.4775585251), (7.957734064, 34.0063243172))
            ThreePointArc((7.957734064, 34.0063243172), (5.4634736915, 34.4950152953), (2.9402772938, 34.8010113996))
        make_face()
    extrude(amount=-F9_DEPTH, mode=Mode.SUBTRACT)

    # F10 (on Front) → F11 (cut, two sides)
    with BuildSketch(Plane.XZ) as f11_sk:
        with Locations((0, 12.7)):
            Rectangle(F10_W, F10_H)
    extrude(amount=-F11_DEPTH, mode=Mode.SUBTRACT)
    extrude(f11_sk.sketch, amount=F11_DEPTH_BACK, mode=Mode.SUBTRACT)

    # F12 (on face) → F13 (cut)
    with BuildSketch(Plane.XY.offset(50.8)):
        with Locations((-13.214321807, 11.8566863239)):
            Circle(F12_R)
    extrude(amount=-F13_DEPTH, mode=Mode.SUBTRACT)


solid = f1.part
